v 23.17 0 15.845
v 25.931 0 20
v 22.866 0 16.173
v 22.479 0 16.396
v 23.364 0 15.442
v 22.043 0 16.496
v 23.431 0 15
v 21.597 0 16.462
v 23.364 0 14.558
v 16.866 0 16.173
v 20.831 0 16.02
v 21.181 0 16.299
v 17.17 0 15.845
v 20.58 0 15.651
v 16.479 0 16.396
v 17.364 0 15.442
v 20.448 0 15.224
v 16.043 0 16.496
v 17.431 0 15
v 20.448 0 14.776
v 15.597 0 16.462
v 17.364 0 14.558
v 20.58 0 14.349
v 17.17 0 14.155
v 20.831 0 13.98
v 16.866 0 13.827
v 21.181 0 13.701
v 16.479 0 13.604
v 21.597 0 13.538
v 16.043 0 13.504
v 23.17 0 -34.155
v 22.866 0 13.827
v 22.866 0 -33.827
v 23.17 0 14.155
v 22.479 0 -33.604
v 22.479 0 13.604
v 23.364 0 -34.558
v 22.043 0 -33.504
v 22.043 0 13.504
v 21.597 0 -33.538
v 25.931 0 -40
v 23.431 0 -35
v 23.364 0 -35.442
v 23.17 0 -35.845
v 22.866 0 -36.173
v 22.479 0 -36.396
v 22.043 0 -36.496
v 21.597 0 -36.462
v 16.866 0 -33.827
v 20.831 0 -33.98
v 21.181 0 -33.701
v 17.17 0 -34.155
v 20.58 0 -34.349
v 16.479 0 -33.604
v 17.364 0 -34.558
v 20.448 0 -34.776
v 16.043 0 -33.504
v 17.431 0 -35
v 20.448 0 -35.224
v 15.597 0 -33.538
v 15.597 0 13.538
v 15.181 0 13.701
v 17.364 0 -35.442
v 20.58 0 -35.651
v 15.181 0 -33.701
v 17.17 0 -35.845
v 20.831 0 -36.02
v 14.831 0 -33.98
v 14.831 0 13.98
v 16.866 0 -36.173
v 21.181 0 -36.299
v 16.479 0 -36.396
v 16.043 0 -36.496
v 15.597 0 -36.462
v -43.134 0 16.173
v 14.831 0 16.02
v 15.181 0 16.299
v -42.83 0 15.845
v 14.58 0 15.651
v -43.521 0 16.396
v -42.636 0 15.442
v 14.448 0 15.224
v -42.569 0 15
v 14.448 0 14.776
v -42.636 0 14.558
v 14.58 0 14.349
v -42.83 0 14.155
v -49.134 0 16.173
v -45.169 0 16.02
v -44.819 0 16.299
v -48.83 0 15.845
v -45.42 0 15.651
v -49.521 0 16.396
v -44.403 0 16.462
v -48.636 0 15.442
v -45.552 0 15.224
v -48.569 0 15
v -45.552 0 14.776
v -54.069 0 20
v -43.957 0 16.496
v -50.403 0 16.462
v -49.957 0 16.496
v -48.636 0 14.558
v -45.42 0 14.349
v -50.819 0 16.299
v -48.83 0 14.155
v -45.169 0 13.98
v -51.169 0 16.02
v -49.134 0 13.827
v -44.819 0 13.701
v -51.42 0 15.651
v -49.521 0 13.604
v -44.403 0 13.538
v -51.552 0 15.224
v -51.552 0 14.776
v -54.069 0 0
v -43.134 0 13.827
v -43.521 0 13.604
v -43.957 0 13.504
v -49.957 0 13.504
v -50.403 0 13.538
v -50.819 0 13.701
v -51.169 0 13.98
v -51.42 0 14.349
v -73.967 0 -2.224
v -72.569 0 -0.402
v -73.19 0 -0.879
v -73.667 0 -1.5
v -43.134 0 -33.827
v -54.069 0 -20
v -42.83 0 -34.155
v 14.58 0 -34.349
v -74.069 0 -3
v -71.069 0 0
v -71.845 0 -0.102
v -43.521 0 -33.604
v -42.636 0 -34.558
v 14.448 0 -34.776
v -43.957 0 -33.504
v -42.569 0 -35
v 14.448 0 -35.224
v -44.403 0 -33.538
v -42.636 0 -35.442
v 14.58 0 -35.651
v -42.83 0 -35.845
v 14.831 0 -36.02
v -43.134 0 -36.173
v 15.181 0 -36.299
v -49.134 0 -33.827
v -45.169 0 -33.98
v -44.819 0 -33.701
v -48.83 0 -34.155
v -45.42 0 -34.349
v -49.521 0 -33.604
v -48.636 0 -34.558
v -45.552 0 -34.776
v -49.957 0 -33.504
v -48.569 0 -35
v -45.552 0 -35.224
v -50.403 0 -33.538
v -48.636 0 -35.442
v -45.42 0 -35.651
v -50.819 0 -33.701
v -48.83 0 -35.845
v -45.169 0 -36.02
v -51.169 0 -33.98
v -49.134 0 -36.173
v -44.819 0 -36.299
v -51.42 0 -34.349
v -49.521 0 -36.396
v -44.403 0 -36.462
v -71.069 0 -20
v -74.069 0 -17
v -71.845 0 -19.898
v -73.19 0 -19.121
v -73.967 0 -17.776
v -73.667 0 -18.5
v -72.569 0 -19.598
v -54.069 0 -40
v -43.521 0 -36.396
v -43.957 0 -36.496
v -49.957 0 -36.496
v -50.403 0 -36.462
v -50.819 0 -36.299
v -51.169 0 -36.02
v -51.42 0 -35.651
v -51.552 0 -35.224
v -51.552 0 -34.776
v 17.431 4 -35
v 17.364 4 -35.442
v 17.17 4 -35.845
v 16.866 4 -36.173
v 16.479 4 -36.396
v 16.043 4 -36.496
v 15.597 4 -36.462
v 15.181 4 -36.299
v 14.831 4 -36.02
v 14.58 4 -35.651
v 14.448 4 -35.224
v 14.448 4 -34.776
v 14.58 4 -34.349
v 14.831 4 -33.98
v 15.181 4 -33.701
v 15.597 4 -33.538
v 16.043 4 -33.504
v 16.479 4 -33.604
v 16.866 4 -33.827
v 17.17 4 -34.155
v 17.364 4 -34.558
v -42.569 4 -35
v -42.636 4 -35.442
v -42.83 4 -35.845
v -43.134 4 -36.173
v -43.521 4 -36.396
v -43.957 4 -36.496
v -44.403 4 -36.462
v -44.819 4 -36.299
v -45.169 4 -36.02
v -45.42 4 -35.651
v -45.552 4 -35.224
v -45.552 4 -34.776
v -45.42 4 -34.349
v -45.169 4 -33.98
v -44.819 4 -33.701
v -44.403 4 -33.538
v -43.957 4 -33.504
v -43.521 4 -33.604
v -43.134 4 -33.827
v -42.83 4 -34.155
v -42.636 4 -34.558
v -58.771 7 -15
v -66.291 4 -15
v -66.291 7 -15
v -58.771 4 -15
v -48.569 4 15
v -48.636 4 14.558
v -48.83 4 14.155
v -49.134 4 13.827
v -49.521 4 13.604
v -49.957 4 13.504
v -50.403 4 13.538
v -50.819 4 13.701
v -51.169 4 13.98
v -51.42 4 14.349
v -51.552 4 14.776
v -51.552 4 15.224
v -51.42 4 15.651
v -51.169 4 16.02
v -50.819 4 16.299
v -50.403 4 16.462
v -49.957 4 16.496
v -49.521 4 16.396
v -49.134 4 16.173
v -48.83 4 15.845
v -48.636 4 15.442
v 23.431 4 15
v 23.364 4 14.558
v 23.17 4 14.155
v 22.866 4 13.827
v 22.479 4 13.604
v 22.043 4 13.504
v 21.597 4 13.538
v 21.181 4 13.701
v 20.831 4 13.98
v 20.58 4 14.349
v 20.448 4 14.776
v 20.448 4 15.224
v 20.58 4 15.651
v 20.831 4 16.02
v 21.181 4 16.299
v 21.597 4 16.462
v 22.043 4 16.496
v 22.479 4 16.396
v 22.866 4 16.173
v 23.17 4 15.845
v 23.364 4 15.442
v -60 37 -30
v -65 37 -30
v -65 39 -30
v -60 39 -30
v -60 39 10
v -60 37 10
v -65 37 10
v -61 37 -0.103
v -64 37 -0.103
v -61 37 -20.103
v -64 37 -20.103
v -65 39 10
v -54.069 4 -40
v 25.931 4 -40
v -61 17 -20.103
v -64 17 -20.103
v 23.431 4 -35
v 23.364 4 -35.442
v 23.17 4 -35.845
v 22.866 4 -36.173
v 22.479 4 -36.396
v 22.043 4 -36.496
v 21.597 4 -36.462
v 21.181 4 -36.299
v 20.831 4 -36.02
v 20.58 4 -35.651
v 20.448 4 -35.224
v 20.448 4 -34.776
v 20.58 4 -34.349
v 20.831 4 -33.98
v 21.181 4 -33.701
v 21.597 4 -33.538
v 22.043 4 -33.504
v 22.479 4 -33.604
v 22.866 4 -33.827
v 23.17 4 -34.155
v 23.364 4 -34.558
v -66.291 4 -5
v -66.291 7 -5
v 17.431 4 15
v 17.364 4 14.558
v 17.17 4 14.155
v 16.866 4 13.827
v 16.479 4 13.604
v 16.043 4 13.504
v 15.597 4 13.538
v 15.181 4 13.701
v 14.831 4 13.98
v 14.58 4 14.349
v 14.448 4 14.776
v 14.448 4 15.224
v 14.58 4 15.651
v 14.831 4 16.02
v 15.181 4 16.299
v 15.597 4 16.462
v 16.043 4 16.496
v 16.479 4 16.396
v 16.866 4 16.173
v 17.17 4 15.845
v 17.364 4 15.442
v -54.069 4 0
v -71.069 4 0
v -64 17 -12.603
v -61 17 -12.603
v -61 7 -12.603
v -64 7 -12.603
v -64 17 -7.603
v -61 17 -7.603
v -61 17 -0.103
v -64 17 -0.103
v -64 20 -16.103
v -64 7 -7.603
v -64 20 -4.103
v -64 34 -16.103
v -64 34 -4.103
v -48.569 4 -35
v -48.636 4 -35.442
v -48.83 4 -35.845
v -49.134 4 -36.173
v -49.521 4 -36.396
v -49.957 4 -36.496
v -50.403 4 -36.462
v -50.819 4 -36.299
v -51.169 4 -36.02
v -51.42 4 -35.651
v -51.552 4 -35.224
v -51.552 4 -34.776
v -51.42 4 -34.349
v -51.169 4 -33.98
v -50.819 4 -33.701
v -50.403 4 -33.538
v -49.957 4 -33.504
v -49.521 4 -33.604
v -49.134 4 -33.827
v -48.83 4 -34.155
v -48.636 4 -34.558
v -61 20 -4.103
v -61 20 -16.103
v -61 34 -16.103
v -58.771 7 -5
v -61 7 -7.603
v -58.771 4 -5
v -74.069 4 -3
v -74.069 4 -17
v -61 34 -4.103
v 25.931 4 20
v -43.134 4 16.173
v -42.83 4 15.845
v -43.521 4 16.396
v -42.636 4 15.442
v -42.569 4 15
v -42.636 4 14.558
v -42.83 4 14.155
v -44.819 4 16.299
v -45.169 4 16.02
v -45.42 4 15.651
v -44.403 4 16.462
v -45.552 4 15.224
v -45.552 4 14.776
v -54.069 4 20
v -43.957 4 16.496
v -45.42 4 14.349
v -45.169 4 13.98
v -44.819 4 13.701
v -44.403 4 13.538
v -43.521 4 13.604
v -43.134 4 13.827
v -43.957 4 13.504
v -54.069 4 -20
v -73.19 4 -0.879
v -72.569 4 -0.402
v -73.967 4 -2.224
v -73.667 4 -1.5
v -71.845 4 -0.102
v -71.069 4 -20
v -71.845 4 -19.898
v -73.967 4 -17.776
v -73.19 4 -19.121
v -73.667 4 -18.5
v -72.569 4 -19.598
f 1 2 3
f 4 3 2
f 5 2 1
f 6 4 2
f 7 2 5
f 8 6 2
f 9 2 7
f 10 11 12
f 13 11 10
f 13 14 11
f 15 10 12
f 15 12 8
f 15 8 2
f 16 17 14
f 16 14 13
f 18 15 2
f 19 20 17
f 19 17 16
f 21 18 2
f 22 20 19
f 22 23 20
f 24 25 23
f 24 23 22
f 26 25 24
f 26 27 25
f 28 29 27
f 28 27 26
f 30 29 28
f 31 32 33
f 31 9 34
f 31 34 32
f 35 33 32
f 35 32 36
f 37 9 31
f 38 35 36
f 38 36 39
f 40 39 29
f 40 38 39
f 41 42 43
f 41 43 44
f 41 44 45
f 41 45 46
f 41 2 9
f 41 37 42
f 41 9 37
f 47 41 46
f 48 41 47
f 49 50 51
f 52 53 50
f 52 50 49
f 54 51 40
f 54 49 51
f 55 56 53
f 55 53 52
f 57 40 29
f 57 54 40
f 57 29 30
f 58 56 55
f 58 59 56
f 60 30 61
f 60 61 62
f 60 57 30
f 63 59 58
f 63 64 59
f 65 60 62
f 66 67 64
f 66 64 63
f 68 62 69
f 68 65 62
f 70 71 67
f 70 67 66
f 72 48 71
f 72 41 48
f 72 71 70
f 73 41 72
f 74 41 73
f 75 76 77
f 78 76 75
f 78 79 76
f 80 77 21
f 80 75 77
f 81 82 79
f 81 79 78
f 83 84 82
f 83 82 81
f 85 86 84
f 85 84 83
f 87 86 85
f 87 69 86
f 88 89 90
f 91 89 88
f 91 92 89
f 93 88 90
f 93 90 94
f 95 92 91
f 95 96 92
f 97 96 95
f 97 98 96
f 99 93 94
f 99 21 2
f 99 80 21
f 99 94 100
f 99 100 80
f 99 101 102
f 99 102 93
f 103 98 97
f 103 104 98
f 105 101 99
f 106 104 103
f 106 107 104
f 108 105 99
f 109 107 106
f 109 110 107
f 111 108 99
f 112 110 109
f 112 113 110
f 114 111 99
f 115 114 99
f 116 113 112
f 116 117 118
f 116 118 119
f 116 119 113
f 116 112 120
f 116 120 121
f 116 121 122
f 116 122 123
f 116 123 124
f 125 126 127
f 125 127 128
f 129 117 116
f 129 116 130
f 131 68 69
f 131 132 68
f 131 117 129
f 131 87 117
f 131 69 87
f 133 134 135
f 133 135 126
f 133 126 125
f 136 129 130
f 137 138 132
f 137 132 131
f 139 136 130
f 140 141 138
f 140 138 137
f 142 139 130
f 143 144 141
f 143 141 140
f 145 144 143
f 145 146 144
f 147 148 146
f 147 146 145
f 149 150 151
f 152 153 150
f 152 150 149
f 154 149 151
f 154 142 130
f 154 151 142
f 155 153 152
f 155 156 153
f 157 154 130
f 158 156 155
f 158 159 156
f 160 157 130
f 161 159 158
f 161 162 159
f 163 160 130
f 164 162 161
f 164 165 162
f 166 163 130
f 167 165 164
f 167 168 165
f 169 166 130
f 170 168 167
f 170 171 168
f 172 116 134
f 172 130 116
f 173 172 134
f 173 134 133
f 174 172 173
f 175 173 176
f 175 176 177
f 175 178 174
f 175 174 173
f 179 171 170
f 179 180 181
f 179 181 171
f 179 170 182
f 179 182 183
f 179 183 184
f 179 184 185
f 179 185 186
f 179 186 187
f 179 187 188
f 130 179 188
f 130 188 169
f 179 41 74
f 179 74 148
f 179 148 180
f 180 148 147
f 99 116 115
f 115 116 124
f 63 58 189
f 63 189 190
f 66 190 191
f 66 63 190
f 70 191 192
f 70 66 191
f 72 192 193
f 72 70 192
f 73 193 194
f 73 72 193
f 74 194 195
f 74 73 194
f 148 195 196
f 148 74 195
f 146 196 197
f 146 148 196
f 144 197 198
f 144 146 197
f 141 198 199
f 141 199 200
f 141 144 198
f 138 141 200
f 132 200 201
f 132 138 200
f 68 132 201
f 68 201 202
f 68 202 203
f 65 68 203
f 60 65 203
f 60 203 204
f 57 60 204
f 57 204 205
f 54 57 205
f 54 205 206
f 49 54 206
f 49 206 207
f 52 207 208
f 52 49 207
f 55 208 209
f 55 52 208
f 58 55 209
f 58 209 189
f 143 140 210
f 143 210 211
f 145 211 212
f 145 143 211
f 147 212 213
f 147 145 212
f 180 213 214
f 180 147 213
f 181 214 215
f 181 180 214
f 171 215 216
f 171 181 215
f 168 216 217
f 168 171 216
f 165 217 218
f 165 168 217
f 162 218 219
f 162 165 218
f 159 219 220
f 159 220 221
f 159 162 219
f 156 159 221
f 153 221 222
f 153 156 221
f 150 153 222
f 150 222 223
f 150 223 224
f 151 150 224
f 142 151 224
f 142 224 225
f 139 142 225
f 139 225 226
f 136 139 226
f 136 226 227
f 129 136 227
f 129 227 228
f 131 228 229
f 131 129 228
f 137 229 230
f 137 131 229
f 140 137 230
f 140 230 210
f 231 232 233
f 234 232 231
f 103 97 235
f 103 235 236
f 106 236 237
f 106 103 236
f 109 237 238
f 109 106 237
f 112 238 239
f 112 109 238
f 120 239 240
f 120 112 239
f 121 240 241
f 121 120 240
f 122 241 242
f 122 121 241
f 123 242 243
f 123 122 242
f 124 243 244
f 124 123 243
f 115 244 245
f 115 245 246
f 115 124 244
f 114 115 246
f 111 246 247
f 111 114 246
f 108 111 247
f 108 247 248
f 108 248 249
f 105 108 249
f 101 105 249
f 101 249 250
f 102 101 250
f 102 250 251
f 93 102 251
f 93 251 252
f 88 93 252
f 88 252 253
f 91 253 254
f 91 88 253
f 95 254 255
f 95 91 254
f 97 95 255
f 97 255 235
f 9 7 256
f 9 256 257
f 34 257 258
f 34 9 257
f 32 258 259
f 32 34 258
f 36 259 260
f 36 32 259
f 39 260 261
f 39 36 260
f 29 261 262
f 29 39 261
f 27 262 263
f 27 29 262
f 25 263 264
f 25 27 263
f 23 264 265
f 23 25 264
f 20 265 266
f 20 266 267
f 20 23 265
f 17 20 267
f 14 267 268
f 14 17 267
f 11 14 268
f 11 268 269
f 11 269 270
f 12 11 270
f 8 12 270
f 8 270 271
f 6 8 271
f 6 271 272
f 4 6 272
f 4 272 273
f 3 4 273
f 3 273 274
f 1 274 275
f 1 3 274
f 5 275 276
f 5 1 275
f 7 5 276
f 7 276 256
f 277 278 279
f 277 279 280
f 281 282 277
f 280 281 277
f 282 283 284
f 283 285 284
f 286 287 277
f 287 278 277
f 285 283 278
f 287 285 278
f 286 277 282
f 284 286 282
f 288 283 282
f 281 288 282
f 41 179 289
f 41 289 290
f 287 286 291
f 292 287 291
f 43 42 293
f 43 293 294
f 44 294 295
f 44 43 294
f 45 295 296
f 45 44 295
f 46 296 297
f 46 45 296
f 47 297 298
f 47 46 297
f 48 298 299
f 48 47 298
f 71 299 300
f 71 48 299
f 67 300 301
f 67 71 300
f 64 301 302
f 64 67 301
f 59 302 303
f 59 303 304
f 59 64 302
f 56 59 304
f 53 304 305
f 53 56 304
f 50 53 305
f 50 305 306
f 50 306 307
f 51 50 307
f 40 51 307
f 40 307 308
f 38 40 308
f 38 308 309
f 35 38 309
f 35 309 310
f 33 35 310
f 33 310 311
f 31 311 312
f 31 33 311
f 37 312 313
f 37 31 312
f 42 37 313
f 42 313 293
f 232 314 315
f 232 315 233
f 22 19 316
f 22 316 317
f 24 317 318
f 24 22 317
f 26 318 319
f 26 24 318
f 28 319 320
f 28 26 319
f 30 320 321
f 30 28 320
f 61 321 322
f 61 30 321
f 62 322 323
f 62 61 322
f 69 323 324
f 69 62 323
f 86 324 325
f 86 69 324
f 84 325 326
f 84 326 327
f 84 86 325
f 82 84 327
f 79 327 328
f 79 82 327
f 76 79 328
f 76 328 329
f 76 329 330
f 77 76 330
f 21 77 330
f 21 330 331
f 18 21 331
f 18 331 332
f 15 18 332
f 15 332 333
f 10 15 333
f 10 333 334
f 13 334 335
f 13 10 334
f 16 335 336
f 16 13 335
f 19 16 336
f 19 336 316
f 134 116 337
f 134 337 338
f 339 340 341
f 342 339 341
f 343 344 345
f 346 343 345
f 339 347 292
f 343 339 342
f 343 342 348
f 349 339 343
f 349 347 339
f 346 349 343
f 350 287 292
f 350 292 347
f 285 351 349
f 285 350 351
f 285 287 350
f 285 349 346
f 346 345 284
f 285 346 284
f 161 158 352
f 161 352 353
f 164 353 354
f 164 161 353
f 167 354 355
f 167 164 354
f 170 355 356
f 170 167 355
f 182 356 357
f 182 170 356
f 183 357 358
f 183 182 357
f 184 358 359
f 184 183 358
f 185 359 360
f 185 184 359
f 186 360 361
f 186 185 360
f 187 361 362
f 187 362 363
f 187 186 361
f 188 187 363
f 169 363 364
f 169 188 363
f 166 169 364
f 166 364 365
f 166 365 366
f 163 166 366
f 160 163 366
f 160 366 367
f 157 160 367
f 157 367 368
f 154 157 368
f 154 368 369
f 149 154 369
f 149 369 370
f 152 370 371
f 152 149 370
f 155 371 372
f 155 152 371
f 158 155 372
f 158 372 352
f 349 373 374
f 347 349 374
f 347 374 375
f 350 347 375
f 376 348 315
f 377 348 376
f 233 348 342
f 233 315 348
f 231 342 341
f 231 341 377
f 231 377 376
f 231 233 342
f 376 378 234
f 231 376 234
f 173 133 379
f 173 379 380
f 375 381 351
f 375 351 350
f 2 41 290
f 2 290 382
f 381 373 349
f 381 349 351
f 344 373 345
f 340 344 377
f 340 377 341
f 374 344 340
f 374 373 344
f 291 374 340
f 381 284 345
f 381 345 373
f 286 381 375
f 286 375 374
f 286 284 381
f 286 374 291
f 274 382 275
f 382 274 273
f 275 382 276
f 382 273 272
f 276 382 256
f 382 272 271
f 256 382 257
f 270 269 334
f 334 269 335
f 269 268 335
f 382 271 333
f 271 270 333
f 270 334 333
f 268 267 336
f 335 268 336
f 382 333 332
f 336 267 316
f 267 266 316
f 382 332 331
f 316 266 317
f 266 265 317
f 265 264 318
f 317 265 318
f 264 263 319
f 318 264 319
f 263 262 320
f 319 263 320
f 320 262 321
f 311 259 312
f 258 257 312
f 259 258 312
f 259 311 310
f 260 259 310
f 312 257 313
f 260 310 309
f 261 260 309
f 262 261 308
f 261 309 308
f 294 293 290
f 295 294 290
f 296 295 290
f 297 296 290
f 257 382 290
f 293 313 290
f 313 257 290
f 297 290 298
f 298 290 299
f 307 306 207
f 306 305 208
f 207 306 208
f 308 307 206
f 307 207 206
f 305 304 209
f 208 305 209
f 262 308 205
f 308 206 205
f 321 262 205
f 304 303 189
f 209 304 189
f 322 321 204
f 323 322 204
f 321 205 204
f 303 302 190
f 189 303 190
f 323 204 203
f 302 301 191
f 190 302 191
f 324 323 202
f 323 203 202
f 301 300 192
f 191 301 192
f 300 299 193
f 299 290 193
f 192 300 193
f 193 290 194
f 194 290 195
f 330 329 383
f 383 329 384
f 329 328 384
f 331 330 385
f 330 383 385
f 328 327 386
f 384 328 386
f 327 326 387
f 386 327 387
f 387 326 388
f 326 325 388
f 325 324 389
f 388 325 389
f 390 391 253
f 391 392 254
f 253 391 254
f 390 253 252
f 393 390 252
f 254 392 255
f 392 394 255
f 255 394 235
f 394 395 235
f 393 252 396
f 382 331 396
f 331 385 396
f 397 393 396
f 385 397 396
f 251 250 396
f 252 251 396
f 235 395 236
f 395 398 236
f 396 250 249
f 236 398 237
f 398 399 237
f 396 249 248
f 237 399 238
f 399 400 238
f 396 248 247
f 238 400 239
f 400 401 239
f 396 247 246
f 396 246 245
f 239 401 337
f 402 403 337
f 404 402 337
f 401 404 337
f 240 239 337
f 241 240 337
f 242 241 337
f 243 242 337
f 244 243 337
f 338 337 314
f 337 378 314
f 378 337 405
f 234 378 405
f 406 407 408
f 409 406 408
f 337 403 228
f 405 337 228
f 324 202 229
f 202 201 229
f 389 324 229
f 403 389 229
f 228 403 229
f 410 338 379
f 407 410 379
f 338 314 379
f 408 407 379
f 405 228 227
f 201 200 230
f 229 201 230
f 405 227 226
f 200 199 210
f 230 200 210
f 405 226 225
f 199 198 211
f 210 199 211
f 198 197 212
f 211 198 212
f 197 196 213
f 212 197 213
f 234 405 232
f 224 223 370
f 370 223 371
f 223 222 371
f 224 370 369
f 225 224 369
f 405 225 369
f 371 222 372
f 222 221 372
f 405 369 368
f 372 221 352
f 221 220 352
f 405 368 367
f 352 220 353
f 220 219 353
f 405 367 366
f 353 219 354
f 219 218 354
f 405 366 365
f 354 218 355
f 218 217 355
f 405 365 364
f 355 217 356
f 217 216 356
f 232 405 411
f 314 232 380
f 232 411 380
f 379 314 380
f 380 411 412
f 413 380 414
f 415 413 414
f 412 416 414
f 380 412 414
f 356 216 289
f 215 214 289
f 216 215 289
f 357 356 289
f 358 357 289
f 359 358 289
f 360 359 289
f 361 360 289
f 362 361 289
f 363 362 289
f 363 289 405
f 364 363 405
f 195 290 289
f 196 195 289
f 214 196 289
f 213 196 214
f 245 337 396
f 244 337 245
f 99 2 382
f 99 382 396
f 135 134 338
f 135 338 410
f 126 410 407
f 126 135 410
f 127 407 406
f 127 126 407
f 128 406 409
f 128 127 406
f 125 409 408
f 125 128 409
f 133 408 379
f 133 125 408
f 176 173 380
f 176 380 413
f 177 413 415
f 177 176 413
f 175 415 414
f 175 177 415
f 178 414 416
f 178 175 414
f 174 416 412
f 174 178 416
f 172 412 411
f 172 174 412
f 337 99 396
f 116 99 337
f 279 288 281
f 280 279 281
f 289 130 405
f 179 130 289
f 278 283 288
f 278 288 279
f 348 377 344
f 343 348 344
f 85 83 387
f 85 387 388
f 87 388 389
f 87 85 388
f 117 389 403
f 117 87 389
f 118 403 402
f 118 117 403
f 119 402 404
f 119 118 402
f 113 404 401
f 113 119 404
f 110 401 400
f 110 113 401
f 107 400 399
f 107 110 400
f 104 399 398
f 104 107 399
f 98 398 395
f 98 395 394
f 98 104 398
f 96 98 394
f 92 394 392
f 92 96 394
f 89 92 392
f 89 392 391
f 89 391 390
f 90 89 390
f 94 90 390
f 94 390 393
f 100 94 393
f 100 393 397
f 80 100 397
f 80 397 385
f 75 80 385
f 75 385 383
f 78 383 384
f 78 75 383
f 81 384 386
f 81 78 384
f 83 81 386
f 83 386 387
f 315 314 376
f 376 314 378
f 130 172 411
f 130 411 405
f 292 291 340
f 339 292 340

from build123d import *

# Parameters (mm, degrees)
SKETCH1_R           = 1.5
BOSS_EXTRUDE2_DEPTH = 4
SKETCH2_W           = 7.520049523
SKETCH2_H           = 10
BOSS_EXTRUDE3_DEPTH = 3
SKETCH4_W           = 12
SKETCH4_H           = 14
BOSS_EXTRUDE4_DEPTH = 64
CUT_EXTRUDE1_DEPTH  = 61
SKETCH6_W           = 5
SKETCH6_H           = 40
BOSS_EXTRUDE5_DEPTH = 2


with BuildPart() as part:
    # Sketch1 → Boss-Extrude2 (new body)
    with BuildSketch(Plane(origin=(0, 0, 0), x_dir=(1, 0, 0), z_dir=(0, 1, 0))):
        with BuildLine():
            Line((-54.068965517, 20), (-54.068965517, 40))
            Line((-54.068965517, 40), (25.931034483, 40))
            Line((25.931034483, 40), (25.931034483, -20))
            Line((25.931034483, -20), (-54.068965517, -20))
            Line((-54.068965517, -20), (-54.068965517, 0))
            Line((-54.068965517, 0), (-71.068965517, 0))
            ThreePointArc((-71.068965517, 0), (-73.190285861, 0.878679656), (-74.068965517, 3))
            Line((-74.068965517, 3), (-74.068965517, 17))
            ThreePointArc((-74.068965517, 17), (-73.190285861, 19.121320344), (-71.068965517, 20))
            Line((-71.068965517, 20), (-54.068965517, 20))
        make_face()
        with Locations((-50.068965517, 35)):
            Circle(SKETCH1_R, mode=Mode.SUBTRACT)
        with Locations((-44.068965517, 35)):
            Circle(SKETCH1_R, mode=Mode.SUBTRACT)
        with Locations((-50.068965517, -15)):
            Circle(SKETCH1_R, mode=Mode.SUBTRACT)
        with Locations((-44.068965517, -15)):
            Circle(SKETCH1_R, mode=Mode.SUBTRACT)
        with Locations((21.931034483, -15)):
            Circle(SKETCH1_R, mode=Mode.SUBTRACT)
        with Locations((15.931034483, -15)):
            Circle(SKETCH1_R, mode=Mode.SUBTRACT)
        with Locations((15.931034483, 35)):
            Circle(SKETCH1_R, mode=Mode.SUBTRACT)
        with Locations((21.931034483, 35)):
            Circle(SKETCH1_R, mode=Mode.SUBTRACT)
    extrude(amount=BOSS_EXTRUDE2_DEPTH)

    # Sketch2 → Boss-Extrude3 (add)
    with BuildSketch(Plane(origin=(0, 4, 0), x_dir=(1, 0, 0), z_dir=(0, 1, 0))):
        with Locations((-62.530885471, 10)):
            Rectangle(SKETCH2_W, SKETCH2_H)
    extrude(amount=BOSS_EXTRUDE3_DEPTH)

    # Sketch4 → Boss-Extrude4 (add)
    with BuildSketch(Plane(origin=(0, 0, 0), x_dir=(0, 0, -1), z_dir=(1, 0, 0))):
        Polygon((7.602984215, 7), (7.602984215, 17), (0.102984215, 17), (0.102984215, 37), (20.102984215, 37), (20.102984215, 17), (12.602984215, 17), (12.602984215, 7), align=None)
        with Locations((10.102984215, 27)):
            Rectangle(SKETCH4_W, SKETCH4_H, mode=Mode.SUBTRACT)
    extrude(amount=-BOSS_EXTRUDE4_DEPTH)

    # Sketch5 → Cut-Extrude1 (cut)
    with BuildSketch(Plane(origin=(0, 0, 0), x_dir=(0, 0, -1), z_dir=(1, 0, 0))):
        Polygon((0.102984215, 37), (0.102984215, 17), (7.602984215, 17), (7.602984215, 7), (12.602984215, 7), (12.602984215, 17), (20.102984215, 17), (20.102984215, 37), align=None)
    extrude(amount=-CUT_EXTRUDE1_DEPTH, mode=Mode.SUBTRACT)

    # Sketch6 → Boss-Extrude5 (add)
    with BuildSketch(Plane(origin=(0, 37, 0), x_dir=(1, 0, 0), z_dir=(0, 1, 0))):
        with Locations((-62.5, 10)):
            Rectangle(SKETCH6_W, SKETCH6_H)
    extrude(amount=BOSS_EXTRUDE5_DEPTH)


solid = part.part
